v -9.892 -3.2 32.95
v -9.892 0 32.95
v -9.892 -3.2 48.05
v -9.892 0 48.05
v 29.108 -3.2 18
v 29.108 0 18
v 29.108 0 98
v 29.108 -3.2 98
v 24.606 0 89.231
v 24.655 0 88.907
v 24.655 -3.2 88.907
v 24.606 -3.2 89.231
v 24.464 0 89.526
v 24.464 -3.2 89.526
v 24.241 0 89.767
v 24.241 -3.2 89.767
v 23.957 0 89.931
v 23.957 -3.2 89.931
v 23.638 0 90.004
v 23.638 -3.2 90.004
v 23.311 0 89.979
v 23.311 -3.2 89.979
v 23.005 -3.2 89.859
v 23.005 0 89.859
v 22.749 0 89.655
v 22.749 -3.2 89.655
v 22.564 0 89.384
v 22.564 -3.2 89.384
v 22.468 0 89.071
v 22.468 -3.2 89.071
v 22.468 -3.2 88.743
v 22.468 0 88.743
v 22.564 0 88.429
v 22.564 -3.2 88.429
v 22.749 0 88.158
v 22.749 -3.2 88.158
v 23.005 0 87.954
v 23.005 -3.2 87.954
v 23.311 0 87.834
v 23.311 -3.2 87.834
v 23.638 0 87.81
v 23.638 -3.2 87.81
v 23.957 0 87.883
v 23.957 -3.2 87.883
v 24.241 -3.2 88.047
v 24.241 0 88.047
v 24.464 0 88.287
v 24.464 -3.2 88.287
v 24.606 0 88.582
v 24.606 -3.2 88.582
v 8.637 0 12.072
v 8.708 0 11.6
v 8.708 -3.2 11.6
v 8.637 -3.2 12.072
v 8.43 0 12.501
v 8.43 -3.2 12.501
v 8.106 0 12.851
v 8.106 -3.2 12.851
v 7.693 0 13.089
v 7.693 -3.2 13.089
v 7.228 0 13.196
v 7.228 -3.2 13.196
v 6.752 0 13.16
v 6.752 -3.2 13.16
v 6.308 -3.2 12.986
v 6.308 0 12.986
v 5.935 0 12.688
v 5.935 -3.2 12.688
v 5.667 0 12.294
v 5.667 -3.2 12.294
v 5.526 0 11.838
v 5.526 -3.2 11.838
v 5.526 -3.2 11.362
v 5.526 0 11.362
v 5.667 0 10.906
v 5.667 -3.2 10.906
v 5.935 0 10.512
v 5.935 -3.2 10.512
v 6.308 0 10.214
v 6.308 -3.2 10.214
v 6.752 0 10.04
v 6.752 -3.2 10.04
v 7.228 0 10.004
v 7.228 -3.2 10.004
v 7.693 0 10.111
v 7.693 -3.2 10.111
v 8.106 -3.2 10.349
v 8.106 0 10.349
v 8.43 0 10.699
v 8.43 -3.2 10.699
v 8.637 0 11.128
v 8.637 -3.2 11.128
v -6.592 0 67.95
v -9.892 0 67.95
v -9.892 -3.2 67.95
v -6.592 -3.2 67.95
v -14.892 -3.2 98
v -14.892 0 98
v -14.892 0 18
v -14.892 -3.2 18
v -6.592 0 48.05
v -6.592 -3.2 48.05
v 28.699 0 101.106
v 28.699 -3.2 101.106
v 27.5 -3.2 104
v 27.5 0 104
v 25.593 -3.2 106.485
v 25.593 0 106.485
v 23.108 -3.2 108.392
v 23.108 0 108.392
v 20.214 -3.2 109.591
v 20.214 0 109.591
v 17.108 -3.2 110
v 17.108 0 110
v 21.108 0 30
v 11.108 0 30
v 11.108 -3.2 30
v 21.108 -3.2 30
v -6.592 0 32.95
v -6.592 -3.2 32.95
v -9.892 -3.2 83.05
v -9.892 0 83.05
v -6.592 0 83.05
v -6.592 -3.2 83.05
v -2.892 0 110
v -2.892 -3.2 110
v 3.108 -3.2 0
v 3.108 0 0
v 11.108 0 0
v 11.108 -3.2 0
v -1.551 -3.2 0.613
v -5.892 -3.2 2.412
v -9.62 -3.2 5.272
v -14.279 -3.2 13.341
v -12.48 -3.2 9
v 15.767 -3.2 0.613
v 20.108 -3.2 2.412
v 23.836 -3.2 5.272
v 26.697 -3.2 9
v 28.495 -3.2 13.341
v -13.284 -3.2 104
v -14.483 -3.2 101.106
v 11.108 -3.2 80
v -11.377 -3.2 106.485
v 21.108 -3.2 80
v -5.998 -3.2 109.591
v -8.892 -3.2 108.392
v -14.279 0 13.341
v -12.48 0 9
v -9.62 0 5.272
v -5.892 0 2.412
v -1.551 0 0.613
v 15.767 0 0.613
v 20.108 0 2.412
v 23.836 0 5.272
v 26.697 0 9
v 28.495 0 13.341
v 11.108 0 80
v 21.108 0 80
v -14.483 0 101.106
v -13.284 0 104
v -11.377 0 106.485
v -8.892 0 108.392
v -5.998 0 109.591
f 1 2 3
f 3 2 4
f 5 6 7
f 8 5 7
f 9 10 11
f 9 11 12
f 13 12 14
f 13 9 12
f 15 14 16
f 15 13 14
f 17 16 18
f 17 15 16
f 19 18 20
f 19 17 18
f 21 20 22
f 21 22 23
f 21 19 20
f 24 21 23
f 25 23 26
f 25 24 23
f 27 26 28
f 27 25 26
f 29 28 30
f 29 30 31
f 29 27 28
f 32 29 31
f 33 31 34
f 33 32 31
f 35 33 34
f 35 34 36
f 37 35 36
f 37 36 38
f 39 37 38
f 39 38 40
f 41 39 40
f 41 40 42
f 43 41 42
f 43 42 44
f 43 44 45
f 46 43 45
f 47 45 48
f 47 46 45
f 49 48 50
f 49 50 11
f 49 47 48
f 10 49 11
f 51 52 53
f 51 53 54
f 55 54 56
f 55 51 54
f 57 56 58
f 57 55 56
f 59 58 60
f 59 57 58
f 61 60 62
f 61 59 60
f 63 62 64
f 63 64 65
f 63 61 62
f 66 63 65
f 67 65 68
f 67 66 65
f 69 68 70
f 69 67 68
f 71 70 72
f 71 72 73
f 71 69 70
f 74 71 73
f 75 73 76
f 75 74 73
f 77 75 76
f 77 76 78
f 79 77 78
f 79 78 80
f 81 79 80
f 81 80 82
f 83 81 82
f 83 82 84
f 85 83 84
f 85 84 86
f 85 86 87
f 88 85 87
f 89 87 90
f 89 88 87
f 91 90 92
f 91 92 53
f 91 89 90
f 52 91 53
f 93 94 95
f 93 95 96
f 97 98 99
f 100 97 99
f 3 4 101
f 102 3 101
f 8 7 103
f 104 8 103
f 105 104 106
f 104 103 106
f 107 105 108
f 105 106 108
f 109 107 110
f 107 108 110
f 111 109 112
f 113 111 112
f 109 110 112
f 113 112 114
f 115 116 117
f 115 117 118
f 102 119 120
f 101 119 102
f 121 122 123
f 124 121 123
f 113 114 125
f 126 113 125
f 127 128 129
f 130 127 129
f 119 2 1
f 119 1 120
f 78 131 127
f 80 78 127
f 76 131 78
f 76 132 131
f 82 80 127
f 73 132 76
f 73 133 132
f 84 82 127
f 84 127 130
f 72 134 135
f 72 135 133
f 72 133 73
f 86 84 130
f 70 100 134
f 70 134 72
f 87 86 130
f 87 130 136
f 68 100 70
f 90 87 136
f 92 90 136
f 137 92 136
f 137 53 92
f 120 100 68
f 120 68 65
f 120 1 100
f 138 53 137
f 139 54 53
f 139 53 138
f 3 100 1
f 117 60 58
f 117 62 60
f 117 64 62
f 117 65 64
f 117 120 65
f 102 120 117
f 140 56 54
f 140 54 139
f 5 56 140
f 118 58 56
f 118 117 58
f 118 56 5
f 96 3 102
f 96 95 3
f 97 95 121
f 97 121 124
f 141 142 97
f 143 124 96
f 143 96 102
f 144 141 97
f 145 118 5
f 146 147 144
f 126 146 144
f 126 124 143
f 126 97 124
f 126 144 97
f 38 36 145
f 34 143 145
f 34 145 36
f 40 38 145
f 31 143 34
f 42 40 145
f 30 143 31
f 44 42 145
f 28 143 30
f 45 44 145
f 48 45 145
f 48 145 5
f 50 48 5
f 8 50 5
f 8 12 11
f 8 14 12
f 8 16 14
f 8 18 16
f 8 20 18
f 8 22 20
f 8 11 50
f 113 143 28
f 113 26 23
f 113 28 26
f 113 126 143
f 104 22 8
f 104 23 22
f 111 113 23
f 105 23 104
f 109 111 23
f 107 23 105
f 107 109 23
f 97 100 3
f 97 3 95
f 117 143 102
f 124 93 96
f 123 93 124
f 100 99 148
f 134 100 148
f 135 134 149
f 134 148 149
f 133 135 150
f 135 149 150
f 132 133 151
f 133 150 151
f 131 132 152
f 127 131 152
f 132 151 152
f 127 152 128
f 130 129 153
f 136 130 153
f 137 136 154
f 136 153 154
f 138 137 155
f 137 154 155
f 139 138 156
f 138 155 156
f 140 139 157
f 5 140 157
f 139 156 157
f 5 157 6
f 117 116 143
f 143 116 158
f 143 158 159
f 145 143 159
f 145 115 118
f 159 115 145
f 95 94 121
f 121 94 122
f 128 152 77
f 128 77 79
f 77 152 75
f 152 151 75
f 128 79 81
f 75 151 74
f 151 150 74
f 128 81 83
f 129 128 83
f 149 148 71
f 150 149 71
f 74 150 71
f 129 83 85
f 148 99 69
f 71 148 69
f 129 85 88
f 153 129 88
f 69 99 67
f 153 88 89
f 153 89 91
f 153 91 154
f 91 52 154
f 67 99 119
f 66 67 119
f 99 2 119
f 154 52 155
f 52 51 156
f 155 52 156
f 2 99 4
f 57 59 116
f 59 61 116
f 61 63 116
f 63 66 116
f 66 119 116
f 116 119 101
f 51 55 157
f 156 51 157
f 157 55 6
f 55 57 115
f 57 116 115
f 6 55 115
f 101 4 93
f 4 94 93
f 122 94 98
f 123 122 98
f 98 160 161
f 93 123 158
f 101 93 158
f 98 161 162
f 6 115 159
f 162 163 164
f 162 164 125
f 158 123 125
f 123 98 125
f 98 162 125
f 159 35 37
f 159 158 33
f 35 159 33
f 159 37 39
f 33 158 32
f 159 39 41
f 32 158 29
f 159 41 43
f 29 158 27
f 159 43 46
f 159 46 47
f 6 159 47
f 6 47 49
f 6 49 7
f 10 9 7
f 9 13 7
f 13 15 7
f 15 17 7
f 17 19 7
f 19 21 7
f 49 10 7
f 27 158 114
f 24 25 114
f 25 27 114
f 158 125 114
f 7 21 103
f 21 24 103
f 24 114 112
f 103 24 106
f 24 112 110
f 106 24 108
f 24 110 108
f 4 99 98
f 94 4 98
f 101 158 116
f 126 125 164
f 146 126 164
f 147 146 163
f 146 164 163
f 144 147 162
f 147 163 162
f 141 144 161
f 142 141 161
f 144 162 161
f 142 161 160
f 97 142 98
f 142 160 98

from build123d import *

# Parameters (mm, degrees)
F0_W     = 3.3
F0_H     = 15.1
F0_R     = 1.6
F0_W_2   = 10
F0_H_2   = 50
F0_R_2   = 1.1
F1_DEPTH = 3.2


with BuildPart() as f1:
    # F0 (on Front) → F1 (new body)
    with BuildSketch(Plane.XZ):
        with BuildLine():
            Line((17.108108, 110), (-2.891892, 110))
            ThreePointArc((-2.891892, 110), (-11.377174, 106.485281), (-14.891892, 98))
            Line((-14.891892, 98), (-14.891892, 18))
            ThreePointArc((-14.891892, 18), (-9.619814, 5.272078), (3.108108, 0))
            Line((3.108108, 0), (11.108108, 0))
            ThreePointArc((11.108108, 0), (23.83603, 5.272078), (29.108108, 18))
            Line((29.108108, 18), (29.108108, 98))
            ThreePointArc((29.108108, 98), (25.593389, 106.485281), (17.108108, 110))
        make_face()
        with Locations((-8.241892, 40.5)):
            Rectangle(F0_W, F0_H, mode=Mode.SUBTRACT)
        with Locations((7.108108, 11.6)):
            Circle(F0_R, mode=Mode.SUBTRACT)
        with Locations((-8.241892, 75.5)):
            Rectangle(F0_W, F0_H, mode=Mode.SUBTRACT)
        with Locations((16.108108, 55)):
            Rectangle(F0_W_2, F0_H_2, mode=Mode.SUBTRACT)
        with Locations((23.555327, 88.906578)):
            Circle(F0_R_2, mode=Mode.SUBTRACT)
    extrude(amount=F1_DEPTH)


solid = f1.part
